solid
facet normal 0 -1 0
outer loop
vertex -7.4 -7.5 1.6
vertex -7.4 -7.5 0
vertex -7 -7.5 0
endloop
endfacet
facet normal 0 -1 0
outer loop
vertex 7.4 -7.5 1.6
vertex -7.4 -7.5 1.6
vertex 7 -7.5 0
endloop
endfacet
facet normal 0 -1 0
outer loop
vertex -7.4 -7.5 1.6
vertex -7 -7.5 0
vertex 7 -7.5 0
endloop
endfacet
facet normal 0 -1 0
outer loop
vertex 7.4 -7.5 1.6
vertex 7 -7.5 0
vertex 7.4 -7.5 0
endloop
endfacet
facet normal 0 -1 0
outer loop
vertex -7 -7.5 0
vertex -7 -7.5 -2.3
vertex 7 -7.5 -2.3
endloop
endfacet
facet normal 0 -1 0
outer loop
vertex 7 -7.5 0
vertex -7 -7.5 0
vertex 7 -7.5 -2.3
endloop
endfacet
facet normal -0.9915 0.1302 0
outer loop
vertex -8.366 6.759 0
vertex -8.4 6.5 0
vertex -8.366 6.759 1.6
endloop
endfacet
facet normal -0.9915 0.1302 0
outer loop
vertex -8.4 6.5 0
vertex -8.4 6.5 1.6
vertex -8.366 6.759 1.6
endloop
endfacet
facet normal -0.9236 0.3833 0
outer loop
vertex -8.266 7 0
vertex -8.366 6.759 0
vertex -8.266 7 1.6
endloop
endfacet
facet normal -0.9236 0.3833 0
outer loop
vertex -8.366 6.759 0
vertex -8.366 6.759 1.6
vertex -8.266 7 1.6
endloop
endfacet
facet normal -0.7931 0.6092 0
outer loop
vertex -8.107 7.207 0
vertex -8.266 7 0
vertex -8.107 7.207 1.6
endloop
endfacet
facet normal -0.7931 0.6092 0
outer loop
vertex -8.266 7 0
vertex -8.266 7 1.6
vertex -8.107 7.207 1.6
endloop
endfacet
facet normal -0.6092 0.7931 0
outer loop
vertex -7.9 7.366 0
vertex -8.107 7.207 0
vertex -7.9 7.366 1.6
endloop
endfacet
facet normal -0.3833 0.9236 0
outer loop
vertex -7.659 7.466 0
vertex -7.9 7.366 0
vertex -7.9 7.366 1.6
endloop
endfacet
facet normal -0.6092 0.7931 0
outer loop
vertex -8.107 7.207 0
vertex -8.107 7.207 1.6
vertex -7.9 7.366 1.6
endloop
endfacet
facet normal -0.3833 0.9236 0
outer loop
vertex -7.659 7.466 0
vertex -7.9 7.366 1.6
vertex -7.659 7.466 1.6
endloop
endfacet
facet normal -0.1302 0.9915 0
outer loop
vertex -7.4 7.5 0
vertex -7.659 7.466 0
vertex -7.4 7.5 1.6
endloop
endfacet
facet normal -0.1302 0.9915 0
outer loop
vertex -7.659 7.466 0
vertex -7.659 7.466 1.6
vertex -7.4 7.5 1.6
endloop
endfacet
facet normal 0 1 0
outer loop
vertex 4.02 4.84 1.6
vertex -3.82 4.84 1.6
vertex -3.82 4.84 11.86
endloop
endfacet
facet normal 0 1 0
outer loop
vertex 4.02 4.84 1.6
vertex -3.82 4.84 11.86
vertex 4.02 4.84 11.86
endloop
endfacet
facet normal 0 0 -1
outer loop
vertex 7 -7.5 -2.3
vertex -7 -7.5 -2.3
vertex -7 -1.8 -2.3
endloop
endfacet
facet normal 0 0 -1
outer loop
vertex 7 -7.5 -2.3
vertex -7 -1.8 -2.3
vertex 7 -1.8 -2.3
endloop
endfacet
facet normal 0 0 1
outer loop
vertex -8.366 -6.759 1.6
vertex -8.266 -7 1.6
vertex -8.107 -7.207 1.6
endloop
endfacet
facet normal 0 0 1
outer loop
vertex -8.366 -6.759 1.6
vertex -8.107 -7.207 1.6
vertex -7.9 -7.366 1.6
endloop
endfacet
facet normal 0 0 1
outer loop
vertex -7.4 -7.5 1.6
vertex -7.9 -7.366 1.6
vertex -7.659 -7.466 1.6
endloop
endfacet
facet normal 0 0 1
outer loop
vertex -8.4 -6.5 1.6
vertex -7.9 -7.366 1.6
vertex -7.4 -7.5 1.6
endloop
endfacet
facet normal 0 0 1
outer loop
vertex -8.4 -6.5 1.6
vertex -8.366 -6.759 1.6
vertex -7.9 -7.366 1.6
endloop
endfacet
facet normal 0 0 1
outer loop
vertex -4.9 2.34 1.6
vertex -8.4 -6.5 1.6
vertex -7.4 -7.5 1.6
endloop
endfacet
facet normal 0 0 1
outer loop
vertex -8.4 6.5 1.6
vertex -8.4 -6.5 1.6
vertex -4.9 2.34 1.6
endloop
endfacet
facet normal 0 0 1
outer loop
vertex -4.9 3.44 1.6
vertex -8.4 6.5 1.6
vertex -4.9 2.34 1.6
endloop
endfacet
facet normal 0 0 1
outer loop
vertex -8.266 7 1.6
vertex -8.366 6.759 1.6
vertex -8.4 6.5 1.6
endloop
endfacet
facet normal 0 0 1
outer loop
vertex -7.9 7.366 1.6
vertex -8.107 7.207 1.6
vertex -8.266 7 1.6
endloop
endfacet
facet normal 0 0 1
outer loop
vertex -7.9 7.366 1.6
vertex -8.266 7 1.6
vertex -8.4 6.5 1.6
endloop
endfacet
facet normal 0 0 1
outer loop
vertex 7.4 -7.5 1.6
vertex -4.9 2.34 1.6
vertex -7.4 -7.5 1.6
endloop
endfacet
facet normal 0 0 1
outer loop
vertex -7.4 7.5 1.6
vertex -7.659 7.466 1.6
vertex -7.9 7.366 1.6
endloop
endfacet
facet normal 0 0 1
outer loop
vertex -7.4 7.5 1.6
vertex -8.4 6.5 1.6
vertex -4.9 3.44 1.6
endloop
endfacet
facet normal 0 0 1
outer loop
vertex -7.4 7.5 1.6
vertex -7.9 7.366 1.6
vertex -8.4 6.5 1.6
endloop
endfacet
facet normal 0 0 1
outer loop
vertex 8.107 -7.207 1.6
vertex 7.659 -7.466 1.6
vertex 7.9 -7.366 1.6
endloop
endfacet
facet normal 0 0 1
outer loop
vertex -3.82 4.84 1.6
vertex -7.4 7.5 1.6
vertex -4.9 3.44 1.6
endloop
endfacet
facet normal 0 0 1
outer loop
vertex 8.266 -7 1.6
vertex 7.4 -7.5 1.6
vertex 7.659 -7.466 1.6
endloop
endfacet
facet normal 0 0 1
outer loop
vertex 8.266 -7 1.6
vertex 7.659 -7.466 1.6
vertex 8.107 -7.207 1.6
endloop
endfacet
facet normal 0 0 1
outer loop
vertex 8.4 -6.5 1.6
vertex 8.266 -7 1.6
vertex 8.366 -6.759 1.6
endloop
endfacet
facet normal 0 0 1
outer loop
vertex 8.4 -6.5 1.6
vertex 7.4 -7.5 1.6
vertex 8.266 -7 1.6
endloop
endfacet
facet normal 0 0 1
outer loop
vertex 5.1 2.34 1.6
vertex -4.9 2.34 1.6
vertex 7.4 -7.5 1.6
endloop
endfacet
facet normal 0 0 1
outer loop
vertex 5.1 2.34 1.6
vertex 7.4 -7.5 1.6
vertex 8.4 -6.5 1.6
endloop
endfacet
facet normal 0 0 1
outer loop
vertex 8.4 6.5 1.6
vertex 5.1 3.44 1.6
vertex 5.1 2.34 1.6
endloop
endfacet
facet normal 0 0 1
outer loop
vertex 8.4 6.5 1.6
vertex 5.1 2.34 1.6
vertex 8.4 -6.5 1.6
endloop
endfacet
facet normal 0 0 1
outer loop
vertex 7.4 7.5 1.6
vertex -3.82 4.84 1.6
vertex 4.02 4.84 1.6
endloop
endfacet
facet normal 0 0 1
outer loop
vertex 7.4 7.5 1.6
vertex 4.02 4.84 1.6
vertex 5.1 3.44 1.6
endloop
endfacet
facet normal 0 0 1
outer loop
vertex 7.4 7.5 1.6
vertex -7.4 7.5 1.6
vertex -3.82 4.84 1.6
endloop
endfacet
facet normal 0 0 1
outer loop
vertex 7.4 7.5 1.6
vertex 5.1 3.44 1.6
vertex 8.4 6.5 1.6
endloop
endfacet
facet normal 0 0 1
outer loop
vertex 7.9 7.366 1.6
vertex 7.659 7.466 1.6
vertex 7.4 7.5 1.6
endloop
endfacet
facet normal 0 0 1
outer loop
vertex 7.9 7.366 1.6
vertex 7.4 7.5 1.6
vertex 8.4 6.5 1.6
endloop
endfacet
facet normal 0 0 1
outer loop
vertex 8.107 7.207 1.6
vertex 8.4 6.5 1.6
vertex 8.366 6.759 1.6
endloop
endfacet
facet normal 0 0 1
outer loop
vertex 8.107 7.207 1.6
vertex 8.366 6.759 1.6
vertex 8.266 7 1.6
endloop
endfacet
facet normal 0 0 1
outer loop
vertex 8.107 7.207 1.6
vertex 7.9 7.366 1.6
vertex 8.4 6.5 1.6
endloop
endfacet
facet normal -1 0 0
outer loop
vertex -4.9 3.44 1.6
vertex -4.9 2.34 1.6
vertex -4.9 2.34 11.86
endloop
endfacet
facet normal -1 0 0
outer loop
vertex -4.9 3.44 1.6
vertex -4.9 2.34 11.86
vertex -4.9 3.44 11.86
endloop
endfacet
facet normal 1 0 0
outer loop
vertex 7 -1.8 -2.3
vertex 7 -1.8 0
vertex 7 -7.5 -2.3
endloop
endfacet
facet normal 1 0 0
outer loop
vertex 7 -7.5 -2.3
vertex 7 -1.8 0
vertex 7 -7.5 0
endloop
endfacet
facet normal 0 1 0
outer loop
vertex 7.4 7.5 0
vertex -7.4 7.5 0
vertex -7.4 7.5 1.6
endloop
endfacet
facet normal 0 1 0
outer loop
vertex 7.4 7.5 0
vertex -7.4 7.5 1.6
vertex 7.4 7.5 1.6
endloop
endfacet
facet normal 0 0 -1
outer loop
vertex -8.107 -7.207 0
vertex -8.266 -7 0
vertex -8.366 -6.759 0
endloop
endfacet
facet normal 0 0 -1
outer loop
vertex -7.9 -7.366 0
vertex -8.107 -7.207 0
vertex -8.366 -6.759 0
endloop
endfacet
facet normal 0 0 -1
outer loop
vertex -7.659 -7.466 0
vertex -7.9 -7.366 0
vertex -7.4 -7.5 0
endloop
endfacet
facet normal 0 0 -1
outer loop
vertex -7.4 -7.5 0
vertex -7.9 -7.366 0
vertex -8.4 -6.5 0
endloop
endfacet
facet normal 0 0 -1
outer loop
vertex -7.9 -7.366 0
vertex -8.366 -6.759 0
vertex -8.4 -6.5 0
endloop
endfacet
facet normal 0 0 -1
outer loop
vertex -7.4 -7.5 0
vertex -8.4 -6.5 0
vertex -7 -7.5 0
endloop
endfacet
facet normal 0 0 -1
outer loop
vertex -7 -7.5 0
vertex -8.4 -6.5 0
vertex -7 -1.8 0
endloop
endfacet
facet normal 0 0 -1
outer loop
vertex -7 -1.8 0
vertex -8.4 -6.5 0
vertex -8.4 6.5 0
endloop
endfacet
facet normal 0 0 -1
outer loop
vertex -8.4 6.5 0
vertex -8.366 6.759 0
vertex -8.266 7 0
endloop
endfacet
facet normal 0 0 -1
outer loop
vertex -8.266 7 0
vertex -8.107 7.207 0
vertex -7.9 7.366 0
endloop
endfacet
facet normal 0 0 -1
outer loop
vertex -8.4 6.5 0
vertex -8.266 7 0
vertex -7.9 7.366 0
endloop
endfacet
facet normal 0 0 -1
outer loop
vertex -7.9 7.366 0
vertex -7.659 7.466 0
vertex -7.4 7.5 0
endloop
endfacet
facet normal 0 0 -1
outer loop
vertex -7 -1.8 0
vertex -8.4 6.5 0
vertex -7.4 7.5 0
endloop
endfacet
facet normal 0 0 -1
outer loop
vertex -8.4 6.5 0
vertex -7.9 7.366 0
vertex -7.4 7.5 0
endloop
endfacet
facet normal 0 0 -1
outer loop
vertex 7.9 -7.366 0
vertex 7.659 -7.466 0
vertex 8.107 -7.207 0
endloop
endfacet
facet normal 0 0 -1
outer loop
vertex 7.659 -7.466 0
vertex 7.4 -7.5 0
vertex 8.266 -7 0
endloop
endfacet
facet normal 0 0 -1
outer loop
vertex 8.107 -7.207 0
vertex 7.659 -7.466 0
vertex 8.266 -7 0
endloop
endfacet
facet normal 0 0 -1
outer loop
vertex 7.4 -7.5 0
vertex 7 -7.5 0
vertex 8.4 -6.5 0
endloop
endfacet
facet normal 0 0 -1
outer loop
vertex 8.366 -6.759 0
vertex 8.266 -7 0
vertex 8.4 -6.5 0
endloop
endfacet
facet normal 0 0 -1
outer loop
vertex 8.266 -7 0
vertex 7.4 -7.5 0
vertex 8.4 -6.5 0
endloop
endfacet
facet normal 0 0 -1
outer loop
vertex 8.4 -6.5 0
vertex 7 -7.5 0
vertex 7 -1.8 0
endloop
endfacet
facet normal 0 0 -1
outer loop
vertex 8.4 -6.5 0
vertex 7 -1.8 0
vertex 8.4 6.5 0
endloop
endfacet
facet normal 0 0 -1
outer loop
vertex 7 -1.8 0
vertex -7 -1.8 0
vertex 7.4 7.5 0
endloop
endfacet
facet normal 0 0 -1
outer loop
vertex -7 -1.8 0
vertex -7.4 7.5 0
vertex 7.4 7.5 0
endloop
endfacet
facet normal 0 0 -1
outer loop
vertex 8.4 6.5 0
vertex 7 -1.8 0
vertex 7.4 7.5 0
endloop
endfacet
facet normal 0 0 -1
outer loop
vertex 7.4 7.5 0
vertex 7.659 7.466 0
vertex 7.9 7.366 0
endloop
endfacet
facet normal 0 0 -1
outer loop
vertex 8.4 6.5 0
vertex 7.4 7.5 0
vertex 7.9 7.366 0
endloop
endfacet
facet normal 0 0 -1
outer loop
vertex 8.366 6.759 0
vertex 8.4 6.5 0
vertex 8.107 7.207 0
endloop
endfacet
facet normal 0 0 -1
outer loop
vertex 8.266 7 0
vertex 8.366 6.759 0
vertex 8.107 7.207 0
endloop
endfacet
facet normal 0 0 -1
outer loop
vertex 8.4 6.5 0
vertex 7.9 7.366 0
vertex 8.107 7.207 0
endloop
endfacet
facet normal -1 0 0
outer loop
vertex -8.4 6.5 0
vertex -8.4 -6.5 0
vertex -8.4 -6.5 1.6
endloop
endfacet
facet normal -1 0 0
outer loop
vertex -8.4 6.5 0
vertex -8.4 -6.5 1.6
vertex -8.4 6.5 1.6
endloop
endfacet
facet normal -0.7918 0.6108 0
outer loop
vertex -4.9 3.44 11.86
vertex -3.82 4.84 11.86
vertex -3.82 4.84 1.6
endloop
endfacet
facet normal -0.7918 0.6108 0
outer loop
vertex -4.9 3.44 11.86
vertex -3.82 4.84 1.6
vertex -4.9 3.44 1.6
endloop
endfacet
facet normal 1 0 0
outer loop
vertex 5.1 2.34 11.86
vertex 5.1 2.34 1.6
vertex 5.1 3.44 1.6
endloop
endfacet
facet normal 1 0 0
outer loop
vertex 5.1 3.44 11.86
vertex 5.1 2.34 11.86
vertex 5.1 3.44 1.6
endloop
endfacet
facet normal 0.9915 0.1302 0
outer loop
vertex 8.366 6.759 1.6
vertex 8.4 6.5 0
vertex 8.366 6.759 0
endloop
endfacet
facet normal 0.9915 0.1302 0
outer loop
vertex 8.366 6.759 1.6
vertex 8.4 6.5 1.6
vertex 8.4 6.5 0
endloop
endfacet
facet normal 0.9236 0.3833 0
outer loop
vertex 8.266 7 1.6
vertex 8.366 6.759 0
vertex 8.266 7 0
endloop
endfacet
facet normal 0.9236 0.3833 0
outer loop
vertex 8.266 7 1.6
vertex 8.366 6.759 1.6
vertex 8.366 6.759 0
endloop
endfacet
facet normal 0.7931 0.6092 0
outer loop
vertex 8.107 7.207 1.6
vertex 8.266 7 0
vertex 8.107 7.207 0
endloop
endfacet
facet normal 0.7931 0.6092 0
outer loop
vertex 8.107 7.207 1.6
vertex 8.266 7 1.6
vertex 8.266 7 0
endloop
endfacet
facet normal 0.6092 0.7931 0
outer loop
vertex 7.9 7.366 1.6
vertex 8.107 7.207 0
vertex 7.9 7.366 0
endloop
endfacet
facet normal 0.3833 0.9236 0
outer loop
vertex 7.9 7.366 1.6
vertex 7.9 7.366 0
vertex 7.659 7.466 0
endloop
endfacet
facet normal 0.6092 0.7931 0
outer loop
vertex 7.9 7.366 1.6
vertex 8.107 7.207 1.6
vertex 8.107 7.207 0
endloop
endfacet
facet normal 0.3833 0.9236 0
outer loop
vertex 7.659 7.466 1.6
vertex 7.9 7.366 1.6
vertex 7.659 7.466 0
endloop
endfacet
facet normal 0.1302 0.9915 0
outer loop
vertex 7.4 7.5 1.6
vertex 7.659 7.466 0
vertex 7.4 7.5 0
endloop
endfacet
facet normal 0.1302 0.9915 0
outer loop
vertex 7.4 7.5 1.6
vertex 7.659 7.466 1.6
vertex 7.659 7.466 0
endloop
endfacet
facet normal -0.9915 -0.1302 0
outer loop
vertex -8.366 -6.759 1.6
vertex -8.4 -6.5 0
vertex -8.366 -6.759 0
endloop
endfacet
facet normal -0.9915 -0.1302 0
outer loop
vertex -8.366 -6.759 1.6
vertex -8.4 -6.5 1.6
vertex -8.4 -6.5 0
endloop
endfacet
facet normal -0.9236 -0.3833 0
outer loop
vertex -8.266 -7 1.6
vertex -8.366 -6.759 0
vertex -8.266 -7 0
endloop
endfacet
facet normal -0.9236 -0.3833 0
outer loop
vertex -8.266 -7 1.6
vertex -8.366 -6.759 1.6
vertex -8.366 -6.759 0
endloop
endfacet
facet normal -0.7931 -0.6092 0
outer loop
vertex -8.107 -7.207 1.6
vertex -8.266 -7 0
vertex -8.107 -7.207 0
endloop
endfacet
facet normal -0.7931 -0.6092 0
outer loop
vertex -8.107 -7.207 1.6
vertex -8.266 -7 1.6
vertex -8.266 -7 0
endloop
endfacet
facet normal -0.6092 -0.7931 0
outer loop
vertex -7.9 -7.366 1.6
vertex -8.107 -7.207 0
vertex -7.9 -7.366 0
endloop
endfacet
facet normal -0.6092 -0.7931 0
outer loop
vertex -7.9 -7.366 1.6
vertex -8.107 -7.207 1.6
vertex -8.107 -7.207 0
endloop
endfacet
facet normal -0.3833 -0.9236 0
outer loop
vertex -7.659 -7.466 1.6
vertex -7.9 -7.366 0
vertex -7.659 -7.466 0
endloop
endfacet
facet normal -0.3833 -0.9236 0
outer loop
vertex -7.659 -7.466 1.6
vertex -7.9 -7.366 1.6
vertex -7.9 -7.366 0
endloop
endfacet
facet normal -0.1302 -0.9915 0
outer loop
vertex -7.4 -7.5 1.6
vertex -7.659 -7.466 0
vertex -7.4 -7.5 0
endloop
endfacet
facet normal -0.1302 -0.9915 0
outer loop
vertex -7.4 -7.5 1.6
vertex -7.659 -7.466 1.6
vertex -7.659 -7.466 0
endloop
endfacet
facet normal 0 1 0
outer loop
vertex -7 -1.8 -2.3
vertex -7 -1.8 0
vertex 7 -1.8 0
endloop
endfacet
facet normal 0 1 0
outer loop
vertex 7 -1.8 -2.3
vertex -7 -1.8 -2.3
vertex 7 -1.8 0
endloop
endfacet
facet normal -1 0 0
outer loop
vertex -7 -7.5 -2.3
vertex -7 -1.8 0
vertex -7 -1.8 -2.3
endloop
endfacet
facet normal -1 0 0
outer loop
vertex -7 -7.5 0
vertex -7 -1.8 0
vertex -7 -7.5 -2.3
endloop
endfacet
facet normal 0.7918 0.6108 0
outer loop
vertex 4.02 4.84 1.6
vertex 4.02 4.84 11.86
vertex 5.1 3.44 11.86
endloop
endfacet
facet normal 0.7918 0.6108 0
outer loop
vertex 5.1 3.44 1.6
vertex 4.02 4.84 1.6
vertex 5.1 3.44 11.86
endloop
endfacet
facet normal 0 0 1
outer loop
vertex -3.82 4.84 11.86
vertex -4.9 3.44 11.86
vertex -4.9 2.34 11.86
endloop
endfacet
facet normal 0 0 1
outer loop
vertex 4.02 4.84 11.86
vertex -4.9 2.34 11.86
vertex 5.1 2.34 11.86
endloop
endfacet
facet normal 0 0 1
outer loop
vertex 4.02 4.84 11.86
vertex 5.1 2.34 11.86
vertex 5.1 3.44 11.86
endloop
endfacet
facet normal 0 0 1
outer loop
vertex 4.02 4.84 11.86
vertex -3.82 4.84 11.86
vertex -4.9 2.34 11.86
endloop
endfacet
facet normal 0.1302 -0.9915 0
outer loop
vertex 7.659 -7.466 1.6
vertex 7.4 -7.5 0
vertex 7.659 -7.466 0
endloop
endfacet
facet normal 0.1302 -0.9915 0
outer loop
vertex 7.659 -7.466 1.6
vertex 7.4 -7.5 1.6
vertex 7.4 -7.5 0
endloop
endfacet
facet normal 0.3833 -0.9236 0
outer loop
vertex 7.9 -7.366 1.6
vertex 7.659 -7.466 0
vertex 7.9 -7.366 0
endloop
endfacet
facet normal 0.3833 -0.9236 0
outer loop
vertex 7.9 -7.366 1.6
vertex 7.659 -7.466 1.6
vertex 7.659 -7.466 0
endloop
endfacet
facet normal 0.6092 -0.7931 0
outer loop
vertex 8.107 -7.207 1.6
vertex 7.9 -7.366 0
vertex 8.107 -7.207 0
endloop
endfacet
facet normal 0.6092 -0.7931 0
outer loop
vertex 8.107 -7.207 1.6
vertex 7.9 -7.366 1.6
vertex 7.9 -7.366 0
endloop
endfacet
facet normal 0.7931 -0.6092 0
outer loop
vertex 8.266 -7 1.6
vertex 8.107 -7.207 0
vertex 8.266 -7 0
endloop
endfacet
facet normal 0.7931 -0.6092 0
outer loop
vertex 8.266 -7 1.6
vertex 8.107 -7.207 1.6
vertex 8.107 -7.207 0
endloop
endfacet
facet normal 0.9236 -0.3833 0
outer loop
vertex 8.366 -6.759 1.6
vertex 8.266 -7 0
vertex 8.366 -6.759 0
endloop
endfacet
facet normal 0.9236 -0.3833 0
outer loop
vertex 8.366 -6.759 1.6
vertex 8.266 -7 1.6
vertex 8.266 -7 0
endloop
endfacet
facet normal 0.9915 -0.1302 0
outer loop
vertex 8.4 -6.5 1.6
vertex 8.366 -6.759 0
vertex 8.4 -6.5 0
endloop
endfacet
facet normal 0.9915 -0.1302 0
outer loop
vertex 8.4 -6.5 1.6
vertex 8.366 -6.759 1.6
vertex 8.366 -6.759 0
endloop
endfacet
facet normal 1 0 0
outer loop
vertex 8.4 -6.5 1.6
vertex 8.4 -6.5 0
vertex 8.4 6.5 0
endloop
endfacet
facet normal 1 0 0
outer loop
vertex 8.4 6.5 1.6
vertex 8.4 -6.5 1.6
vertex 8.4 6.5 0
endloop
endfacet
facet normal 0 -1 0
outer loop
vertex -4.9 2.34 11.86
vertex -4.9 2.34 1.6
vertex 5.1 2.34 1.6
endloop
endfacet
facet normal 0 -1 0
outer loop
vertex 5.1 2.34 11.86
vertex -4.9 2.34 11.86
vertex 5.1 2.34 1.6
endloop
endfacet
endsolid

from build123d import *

# Parameters (mm, degrees)
SKETCH_W     = 16.8
SKETCH_H     = 15
PAD_DEPTH    = 1.6
FILLET_R     = 1
SKETCH001_W  = 10
SKETCH001_H  = 2.5
PAD001_DEPTH = 10.26
POCKET_DEPTH = 10.26
SKETCH003_W  = 14
SKETCH003_H  = 5.7
PAD002_DEPTH = 2.3


with BuildPart() as part:
    # Sketch → Pad (new body)
    with BuildSketch(Plane.XY):
        Rectangle(SKETCH_W, SKETCH_H)
    extrude(amount=PAD_DEPTH)

    # Fillet
    fillet_edges = [part.edges().sort_by_distance(p)[0] for p in [
        (8.4, 7.5, 0.8),
        (8.4, -7.5, 0.8),
        (-8.4, -7.5, 0.8),
        (-8.4, 7.5, 0.8),
    ]]
    fillet(fillet_edges, radius=FILLET_R)

    # Sketch001 (on Face5 of Fillet) → Pad001 (join)
    with BuildSketch(Plane.XY.offset(1.6)):
        with Locations((0.1, 3.59)):
            Rectangle(SKETCH001_W, SKETCH001_H)
    extrude(amount=PAD001_DEPTH)

    # Sketch002 (on Face15 of Pad001) → Pocket (cut)
    with BuildSketch(Plane.XY.offset(11.86)):
        Polygon((-4.9, 3.44), (-4.9, 4.84), (-3.82, 4.84), align=None)
        Polygon((5.1, 4.84), (4.02, 4.84), (5.1, 3.44), align=None)
    extrude(amount=-POCKET_DEPTH, mode=Mode.SUBTRACT)

    # Sketch003 (on Face2 of Pocket) → Pad002 (join)
    with BuildSketch(Plane(origin=(0, 0, 0), x_dir=(1, 0, 0), z_dir=(0, 0, -1))):
        with Locations((0, 4.65)):
            Rectangle(SKETCH003_W, SKETCH003_H)
    extrude(amount=PAD002_DEPTH)


solid = part.part
